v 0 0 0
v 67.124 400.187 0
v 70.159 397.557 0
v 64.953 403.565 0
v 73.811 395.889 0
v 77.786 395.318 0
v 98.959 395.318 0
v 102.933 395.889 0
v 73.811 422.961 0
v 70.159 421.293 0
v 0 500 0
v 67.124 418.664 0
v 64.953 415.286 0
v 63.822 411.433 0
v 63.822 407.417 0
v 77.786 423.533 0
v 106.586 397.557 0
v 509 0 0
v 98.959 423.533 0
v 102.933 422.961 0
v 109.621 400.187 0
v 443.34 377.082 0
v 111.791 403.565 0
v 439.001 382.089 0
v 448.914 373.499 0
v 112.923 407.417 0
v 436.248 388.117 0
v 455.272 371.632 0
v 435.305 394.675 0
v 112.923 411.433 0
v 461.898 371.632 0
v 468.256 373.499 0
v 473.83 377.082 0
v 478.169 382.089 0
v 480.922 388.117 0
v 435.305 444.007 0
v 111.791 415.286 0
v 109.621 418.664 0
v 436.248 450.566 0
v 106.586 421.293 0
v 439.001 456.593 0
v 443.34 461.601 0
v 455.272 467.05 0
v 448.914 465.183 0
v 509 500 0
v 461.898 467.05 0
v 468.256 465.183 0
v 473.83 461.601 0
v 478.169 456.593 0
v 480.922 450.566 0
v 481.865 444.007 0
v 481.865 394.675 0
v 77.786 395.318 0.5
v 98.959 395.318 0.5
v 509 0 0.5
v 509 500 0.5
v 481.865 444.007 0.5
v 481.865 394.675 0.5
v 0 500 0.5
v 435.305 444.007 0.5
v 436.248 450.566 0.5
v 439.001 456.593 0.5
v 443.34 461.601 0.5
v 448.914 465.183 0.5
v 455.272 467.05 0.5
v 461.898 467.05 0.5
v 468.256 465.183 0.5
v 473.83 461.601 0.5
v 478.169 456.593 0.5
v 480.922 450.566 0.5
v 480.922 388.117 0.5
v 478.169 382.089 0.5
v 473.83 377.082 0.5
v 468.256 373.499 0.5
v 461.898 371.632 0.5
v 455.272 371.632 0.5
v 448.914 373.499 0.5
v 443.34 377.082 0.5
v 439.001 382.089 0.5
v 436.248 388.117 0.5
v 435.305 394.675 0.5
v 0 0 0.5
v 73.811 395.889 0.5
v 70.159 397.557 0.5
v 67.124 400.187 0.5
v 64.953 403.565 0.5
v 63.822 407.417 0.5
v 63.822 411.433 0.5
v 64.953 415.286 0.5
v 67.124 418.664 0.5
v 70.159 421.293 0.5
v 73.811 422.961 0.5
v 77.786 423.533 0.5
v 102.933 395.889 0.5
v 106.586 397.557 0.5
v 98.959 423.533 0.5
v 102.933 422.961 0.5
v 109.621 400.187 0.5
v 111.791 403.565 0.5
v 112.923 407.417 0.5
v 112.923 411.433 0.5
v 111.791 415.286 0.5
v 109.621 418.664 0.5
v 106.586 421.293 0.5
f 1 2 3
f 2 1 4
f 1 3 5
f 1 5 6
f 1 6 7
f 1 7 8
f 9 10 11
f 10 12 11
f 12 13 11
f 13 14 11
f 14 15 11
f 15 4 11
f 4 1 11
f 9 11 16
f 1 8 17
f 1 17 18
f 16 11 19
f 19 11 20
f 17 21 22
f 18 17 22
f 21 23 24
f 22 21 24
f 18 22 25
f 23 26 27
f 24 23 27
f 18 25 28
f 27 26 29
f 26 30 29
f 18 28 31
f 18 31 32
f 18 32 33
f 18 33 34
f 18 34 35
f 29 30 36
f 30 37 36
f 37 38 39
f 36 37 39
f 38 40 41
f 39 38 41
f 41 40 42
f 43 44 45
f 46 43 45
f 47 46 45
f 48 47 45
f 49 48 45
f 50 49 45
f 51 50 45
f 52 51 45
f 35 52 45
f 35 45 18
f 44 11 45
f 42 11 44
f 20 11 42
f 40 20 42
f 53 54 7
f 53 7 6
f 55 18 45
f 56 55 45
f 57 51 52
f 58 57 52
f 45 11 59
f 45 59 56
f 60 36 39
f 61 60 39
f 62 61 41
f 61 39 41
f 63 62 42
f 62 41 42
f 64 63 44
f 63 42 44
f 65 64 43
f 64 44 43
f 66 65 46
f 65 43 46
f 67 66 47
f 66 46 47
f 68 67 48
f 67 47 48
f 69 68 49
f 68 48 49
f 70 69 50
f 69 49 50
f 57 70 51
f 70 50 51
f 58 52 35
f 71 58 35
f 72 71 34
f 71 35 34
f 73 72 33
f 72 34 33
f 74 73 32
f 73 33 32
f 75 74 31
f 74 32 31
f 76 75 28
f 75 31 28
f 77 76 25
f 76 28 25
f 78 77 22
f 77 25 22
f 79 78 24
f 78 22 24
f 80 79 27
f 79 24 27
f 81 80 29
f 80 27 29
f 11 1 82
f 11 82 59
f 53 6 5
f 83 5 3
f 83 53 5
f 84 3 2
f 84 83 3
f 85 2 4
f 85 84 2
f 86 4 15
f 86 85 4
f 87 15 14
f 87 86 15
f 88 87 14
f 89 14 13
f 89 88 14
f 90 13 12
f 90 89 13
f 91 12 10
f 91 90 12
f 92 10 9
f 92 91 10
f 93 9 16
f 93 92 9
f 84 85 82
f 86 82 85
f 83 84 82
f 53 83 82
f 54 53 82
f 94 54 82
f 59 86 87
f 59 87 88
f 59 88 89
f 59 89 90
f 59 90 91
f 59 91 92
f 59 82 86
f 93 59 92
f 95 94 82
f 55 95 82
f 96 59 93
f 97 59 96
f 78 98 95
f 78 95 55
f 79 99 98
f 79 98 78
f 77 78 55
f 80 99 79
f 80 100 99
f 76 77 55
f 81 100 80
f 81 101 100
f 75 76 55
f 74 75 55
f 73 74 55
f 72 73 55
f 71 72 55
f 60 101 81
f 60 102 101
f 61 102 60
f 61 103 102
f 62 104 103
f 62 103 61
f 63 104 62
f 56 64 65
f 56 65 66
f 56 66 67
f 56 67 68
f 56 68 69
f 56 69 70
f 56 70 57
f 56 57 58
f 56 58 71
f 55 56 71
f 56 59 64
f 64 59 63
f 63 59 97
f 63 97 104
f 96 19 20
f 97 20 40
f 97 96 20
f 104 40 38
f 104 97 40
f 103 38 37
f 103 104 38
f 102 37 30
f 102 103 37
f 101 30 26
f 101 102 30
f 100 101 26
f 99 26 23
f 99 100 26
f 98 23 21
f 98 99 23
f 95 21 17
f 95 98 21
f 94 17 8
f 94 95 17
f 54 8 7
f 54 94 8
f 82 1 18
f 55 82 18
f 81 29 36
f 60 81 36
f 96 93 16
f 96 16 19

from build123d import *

# Parameters (mm, degrees)
SKETCH1_W           = 509
SKETCH1_H           = 500
BOSS_EXTRUDE1_DEPTH = 0.5
CUT_EXTRUDE4_DEPTH  = 10


with BuildPart() as part:
    # Sketch1 → Boss-Extrude1 (new body)
    with BuildSketch(Plane.XY):
        with Locations((254.5, 250)):
            Rectangle(SKETCH1_W, SKETCH1_H)
        with BuildLine():
            Line((481.865015679, 444.006934605), (481.865015679, 394.675474189))
            ThreePointArc((481.865015679, 394.675474189), (458.585000651, 371.395459161), (435.304985623, 394.675474189))
            Line((435.304985623, 394.675474189), (435.304985623, 444.006934605))
            ThreePointArc((435.304985623, 444.006934605), (458.585000651, 467.286949633), (481.865015679, 444.006934605))
        make_face(mode=Mode.SUBTRACT)
    extrude(amount=BOSS_EXTRUDE1_DEPTH)

    # Sketch8 → Cut-Extrude4 (cut)
    with BuildSketch(Plane.XY.offset(0.5)):
        with BuildLine():
            Line((77.785706476, 423.532533194), (98.958896901, 423.532533194))
            ThreePointArc((98.958896901, 423.532533194), (113.066279785, 409.425150311), (98.958896901, 395.317767427))
            Line((98.958896901, 395.317767427), (77.785706476, 395.317767427))
            ThreePointArc((77.785706476, 395.317767427), (63.678323592, 409.425150311), (77.785706476, 423.532533194))
        make_face()
    extrude(amount=-CUT_EXTRUDE4_DEPTH, mode=Mode.SUBTRACT)


solid = part.part
